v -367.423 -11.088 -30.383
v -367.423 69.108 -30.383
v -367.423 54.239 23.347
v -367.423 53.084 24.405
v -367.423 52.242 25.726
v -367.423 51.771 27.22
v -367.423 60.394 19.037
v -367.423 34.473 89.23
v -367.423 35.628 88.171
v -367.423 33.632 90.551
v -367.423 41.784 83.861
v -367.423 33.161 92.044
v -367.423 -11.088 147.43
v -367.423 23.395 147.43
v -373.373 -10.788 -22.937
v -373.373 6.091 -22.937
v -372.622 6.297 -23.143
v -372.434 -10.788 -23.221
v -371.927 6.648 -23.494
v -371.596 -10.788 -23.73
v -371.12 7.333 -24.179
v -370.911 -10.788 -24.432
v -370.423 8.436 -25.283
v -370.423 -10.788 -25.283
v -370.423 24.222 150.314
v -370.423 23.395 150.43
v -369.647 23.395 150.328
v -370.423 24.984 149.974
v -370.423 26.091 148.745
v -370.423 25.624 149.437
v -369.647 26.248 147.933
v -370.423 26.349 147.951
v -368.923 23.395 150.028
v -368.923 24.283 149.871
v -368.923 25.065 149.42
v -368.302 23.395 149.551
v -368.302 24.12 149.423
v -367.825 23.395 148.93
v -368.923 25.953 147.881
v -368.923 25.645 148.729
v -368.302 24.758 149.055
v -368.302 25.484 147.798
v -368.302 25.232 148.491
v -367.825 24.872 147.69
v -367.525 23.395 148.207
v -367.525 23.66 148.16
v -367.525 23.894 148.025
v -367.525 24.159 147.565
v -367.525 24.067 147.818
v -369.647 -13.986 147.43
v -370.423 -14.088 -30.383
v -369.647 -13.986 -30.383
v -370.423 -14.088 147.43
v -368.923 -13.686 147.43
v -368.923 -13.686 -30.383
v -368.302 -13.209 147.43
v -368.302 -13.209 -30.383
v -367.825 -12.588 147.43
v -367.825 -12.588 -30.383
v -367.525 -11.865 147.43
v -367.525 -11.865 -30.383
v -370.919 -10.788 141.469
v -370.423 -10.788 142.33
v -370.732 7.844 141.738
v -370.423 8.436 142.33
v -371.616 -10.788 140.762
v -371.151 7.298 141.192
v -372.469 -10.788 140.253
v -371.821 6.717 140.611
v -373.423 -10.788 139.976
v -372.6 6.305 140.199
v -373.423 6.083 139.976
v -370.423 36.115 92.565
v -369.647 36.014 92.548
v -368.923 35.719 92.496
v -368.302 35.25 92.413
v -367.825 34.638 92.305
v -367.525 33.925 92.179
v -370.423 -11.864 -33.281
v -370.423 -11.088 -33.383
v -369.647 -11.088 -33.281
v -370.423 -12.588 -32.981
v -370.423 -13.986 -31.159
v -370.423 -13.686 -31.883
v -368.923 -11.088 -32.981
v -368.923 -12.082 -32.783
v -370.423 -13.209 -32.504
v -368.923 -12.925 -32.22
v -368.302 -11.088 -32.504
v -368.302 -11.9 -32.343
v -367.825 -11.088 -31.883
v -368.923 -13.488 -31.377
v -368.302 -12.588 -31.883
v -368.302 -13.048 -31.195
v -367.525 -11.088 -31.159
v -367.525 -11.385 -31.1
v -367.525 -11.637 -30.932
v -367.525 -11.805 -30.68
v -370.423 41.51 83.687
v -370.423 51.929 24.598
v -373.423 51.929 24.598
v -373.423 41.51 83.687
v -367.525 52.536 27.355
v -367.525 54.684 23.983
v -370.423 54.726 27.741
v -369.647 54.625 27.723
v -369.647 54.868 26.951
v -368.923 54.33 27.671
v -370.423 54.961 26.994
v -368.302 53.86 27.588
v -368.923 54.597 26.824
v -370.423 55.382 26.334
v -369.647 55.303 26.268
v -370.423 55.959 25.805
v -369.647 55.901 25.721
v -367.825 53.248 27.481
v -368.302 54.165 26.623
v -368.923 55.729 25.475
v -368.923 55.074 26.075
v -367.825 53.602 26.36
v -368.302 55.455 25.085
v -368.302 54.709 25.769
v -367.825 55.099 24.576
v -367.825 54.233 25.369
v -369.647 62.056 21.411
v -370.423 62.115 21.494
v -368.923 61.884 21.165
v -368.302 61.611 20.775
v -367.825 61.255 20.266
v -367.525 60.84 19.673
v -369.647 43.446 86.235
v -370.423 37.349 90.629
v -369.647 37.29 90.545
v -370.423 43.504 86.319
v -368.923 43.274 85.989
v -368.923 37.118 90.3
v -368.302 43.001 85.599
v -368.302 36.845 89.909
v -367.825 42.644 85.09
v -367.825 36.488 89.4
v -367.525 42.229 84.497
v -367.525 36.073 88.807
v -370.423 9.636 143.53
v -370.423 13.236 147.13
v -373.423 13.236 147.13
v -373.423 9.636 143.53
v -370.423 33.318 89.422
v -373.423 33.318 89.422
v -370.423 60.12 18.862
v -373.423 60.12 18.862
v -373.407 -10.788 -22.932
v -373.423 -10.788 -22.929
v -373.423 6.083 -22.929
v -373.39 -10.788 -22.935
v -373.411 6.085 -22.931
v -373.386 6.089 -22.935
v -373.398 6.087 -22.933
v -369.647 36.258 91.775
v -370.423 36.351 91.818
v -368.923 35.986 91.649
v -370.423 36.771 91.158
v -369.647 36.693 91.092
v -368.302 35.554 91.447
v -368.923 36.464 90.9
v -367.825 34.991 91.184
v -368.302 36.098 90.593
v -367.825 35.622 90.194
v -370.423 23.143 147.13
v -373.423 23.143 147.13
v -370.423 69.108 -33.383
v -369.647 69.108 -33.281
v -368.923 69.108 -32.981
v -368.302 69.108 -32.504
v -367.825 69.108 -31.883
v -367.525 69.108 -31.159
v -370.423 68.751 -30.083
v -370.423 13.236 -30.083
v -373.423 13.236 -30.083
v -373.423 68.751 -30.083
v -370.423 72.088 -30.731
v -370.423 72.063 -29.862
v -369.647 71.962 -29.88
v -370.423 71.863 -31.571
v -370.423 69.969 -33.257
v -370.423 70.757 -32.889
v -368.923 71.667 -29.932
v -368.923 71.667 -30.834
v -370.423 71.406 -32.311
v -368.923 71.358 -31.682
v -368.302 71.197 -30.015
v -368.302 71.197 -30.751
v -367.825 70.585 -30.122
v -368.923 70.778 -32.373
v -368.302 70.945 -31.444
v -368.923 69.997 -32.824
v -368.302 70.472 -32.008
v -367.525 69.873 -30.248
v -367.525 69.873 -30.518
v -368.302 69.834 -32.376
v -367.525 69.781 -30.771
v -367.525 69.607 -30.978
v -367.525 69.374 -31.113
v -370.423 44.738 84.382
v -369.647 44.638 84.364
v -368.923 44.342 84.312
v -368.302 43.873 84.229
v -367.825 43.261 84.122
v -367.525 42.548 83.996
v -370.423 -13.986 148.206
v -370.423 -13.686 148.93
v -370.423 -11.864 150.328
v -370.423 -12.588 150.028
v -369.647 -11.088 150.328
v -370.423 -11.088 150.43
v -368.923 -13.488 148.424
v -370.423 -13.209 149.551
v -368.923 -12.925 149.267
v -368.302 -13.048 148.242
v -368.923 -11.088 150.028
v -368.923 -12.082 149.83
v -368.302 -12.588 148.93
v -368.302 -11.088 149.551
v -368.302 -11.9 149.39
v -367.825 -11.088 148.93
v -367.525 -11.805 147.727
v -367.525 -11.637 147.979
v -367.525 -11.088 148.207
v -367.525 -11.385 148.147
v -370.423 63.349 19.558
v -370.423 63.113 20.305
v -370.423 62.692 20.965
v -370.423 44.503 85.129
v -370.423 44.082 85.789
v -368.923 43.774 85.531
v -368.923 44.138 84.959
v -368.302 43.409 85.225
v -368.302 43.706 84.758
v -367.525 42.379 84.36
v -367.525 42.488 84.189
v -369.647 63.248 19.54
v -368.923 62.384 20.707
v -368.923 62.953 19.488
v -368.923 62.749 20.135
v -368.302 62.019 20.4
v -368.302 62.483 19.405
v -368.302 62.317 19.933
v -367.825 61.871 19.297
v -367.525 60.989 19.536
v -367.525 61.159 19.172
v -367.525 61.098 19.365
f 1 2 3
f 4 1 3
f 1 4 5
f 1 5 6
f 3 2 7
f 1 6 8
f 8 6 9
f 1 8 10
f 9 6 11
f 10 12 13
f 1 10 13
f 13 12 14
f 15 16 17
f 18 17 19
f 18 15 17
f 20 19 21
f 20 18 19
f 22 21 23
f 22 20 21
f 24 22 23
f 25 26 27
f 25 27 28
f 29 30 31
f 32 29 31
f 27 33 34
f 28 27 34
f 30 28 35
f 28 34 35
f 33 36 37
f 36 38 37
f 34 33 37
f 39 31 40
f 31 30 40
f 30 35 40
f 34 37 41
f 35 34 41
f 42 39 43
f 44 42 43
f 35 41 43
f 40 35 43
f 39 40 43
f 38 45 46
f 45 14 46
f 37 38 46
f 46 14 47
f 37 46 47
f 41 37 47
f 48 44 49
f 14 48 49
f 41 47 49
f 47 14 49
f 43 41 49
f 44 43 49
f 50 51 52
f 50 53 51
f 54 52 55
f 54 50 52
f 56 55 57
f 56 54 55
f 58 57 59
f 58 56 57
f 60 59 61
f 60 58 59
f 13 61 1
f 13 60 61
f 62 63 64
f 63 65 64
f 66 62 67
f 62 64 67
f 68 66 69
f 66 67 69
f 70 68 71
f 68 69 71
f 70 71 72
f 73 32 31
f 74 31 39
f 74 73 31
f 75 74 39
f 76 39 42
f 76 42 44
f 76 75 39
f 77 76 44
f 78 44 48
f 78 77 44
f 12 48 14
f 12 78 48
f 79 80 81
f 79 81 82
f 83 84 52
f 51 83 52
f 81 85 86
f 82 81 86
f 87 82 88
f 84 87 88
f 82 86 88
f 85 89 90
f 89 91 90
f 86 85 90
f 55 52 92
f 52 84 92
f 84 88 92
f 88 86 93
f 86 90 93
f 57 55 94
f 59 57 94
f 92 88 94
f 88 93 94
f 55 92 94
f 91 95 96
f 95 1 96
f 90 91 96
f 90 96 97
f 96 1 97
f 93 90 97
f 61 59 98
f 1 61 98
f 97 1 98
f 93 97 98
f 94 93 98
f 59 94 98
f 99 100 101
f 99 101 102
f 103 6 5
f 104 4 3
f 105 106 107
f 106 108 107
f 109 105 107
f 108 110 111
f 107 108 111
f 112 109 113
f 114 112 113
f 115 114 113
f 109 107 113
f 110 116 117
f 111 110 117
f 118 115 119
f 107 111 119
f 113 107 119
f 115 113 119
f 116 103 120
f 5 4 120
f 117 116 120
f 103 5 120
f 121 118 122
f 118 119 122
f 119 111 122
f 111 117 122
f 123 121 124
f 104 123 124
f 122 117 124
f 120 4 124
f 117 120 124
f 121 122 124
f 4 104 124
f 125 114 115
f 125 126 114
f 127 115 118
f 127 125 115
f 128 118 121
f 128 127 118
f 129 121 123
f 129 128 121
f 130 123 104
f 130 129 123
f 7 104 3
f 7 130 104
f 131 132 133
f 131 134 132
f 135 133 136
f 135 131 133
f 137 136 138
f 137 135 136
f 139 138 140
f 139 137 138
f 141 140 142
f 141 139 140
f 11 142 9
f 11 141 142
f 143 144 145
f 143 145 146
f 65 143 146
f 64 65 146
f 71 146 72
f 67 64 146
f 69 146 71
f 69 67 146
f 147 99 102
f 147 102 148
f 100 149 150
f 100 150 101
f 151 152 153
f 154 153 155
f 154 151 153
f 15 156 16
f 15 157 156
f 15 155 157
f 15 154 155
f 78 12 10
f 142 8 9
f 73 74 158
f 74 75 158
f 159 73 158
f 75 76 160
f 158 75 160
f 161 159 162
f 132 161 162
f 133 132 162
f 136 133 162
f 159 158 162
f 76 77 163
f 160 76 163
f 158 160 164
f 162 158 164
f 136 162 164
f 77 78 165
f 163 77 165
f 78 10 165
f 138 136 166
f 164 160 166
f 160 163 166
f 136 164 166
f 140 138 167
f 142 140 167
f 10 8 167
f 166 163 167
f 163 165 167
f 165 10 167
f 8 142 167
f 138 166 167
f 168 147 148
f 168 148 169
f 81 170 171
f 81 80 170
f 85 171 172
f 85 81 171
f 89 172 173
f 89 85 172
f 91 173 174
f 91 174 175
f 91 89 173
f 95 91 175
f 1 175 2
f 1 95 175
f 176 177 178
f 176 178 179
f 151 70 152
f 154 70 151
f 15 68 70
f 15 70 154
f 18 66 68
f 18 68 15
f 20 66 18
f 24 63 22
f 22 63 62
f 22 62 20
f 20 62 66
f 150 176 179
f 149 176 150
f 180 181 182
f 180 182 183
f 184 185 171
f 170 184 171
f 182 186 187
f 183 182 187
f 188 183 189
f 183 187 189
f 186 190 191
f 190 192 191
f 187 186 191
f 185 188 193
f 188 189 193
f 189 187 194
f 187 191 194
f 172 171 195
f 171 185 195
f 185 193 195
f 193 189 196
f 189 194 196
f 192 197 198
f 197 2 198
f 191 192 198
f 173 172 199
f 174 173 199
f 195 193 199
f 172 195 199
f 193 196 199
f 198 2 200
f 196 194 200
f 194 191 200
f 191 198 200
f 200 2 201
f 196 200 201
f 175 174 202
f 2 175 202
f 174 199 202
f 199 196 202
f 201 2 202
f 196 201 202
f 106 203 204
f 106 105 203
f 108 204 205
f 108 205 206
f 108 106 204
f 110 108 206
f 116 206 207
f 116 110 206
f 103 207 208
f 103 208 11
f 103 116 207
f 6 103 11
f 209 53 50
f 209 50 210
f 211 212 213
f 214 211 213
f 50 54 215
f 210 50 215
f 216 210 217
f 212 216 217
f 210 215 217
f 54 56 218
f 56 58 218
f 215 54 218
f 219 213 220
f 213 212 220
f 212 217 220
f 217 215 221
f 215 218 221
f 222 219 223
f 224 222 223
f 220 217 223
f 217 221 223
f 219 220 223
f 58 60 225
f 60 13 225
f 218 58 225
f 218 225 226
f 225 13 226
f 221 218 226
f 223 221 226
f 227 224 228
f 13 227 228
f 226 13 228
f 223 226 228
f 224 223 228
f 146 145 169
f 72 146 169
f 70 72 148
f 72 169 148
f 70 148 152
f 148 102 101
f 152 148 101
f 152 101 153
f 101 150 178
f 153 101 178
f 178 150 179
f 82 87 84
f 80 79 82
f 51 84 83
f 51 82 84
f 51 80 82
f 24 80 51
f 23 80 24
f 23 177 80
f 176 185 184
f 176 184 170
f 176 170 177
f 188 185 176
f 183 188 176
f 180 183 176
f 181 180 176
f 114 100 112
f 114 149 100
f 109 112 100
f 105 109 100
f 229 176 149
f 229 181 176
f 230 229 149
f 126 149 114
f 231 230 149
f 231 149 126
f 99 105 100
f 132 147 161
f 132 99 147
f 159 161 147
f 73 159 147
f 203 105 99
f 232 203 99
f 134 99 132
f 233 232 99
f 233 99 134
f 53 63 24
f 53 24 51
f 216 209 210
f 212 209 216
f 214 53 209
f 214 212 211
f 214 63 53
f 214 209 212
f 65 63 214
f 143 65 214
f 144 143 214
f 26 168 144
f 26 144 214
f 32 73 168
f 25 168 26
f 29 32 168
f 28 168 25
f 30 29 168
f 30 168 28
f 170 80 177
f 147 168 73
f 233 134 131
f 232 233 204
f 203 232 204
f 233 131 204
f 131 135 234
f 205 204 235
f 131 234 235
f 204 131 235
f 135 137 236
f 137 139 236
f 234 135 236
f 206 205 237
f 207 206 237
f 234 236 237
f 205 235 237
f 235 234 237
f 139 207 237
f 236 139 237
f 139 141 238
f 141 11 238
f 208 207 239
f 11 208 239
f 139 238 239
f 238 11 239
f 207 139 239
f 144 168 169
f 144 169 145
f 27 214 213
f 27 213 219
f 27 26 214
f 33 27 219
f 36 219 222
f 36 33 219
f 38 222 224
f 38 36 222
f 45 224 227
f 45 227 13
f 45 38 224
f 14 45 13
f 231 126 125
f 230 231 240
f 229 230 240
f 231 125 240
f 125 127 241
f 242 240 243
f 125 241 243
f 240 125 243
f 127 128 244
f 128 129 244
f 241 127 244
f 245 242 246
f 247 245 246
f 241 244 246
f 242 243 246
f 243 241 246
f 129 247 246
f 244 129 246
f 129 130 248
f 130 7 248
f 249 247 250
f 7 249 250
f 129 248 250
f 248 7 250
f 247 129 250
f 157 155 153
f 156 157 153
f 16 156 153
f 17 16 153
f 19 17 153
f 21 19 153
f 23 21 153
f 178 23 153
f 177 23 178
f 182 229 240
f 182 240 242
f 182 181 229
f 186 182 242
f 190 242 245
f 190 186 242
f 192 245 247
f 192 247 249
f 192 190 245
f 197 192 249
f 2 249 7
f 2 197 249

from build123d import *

# Parameters (mm, degrees)
BOSS_EXTRUDE1_DEPTH  = 3
FILLET1_R            = 3
BOSS_EXTRUDE2_DEPTH  = 3
CUT_EXTRUDE1_START   = -16.870694295
CUT_EXTRUDE1_DEPTH   = 17.870694295
CUT_EXTRUDE1_START_2 = 6.082684495
CUT_EXTRUDE1_2_DEPTH = 3.553569774
CUT_EXTRUDE1_START_3 = -94.677172909
CUT_EXTRUDE1_3_DEPTH = 3.677172909
CUT_EXTRUDE2_REACH   = 418.489


with BuildPart() as part:
    # Sketch1 → Boss-Extrude1 (new body)
    with BuildSketch(Plane.ZY.offset(376.423184311)):
        with BuildLine():
            Line((-33.382889261, -4.0880098), (-33.382889261, -11.0880098))
            ThreePointArc((-33.382889261, -11.0880098), (-32.504209605, -13.209330144), (-30.382889261, -14.0880098))
            Line((-30.382889261, -14.0880098), (147.429996243, -14.0880098))
            ThreePointArc((147.429996243, -14.0880098), (149.551316587, -13.209330144), (150.429996243, -11.0880098))
            Line((150.429996243, -11.0880098), (150.429996243, -4.0880098))
            Line((150.429996243, -4.0880098), (150.429996243, 23.394691306))
            ThreePointArc((150.429996243, 23.394691306), (149.728129572, 25.323054136), (147.950940776, 26.349114566))
            Line((147.950940776, 26.349114566), (92.565293245, 36.115098569))
            ThreePointArc((92.565293245, 36.115098569), (91.474338953, 36.539347491), (90.628781645, 37.348792519))
            Line((90.628781645, 37.348792519), (86.318516116, 43.504489644))
            ThreePointArc((86.318516116, 43.504489644), (85.472958808, 44.313934672), (84.382004516, 44.738183594))
            Line((84.382004516, 44.738183594), (27.741063701, 54.725509672))
            ThreePointArc((27.741063701, 54.725509672), (26.650109409, 55.149758594), (25.804552101, 55.959203622))
            Line((25.804552101, 55.959203622), (21.494286572, 62.114900747))
            ThreePointArc((21.494286572, 62.114900747), (20.648729264, 62.924345775), (19.557774972, 63.348594697))
            Line((19.557774972, 63.348594697), (-29.861944728, 72.062624659))
            ThreePointArc((-29.861944728, 72.062624659), (-32.31125209, 71.406334729), (-33.382889261, 69.1082014))
            Line((-33.382889261, 69.1082014), (-33.382889261, -4.0880098))
        make_face()
    extrude(amount=BOSS_EXTRUDE1_DEPTH)

    # Fillet1
    fillet1_edges = [part.edges().sort_by_distance(p)[0] for p in [
        (-379.423184311, 67.705609678, -5.152084878),
        (-379.423184311, 62.924345775, 20.648729264),
        (-379.423184311, 59.037052184, 23.649419336),
        (-379.423184311, 55.149758594, 26.650109409),
        (-379.423184311, 49.731846633, 56.061534109),
        (-379.423184311, 44.313934672, 85.472958808),
        (-379.423184311, 40.426641081, 88.473648881),
        (-379.423184311, 36.539347491, 91.474338953),
        (-379.423184311, 31.232106567, 120.258117011),
        (-379.423184311, 25.323054136, 149.728129572),
        (-379.423184311, 6.153340753, 150.429996243),
        (-379.423184311, -13.209330144, 149.551316587),
        (-379.423184311, -14.0880098, 58.523553491),
        (-379.423184311, -13.209330144, -32.504209605),
        (-379.423184311, 29.0100958, -33.382889261),
        (-379.423184311, 71.406334729, -32.31125209),
    ]]
    fillet(fillet1_edges, radius=FILLET1_R - 0.0001)  # a hair under: the kernel refuses the full size

    # Sketch2 → Boss-Extrude2 (add)
    with BuildSketch(Plane(origin=(-376.423184311, 0, 0), x_dir=(0, 0, -1), z_dir=(1, 0, 0))):
        Polygon((-147.129996243, 23.142961417), (-147.129996243, 13.236254269), (-143.529996243, 9.636254269), (-143.529996243, -4.0880098), (-143.529996243, -10.7880098), (26.482889261, -10.7880098), (26.482889261, -4.0880098), (26.482889261, 9.636254269), (30.082889261, 13.236254269), (30.082889261, 68.750675322), (-18.862359767, 60.120307341), (-24.598124131, 51.928786898), (-83.686589311, 41.509896238), (-89.422353675, 33.318375795), align=None)
    extrude(amount=BOSS_EXTRUDE2_DEPTH)

    # Cut-Extrude1: read off the stored shape, not the designer's step
    # Cut-Extrude1 outline → Cut-Extrude1 (cut)
    with BuildSketch(Plane.XZ.offset(10.7880098).offset(CUT_EXTRUDE1_START)):
        with BuildLine():
            Line((-376.423184311, 143.529996243), (-376.423184311, 142.329996243))
            ThreePointArc((-376.423184311, 142.329996243), (-375.230428102, 140.761580148), (-373.423184311, 139.97642647))
            Line((-373.423184311, 139.97642647), (-373.423184311, 143.529996243))
            Line((-373.423184311, 143.529996243), (-376.423184311, 143.529996243))
        make_face()
    extrude(amount=CUT_EXTRUDE1_DEPTH, mode=Mode.SUBTRACT)

    # Cut-Extrude1 2 outline → Cut-Extrude1 2 (cut)
    with BuildSketch(Plane(origin=(0, 0, 0), x_dir=(1, 0, 0), z_dir=(0, 1, 0)).offset(CUT_EXTRUDE1_START_2)):
        with BuildLine():
            ThreePointArc((-373.423184311, -139.97642647), (-375.230428102, -140.761580148), (-376.423184311, -142.329996243))
            Line((-376.423184311, -142.329996243), (-376.423184311, -143.529996243))
            Line((-376.423184311, -143.529996243), (-373.423184311, -143.529996243))
            Line((-373.423184311, -143.529996243), (-373.423184311, -139.97642647))
        make_face()
    extrude(amount=CUT_EXTRUDE1_2_DEPTH, mode=Mode.SUBTRACT)

    # Cut-Extrude1 3 outline → Cut-Extrude1 3 (add)
    with BuildSketch(Plane(origin=(0, 0, 0), x_dir=(1, 0, 0), z_dir=(0, 0.707106781186553, -0.707106781186542)).offset(CUT_EXTRUDE1_START_3)):
        with BuildLine():
            Line((-376.423184311, -106.607838111), (-376.423184311, -113.39606321))
            Line((-376.423184311, -113.39606321), (-373.423184311, -113.39606321))
            Line((-373.423184311, -113.39606321), (-373.423184311, -103.279387817))
            add(Edge.make_bspline(
                [(-373.423184311, -103.279387817), (-375.582623677, -103.754880716), (-376.423184311, -106.607838111)],
                knots=[0.154459598, 0.154459598, 0.154459598, 1.176005207, 1.176005207, 1.176005207], degree=2, weights=[1, 0.872366982, 1]))
        make_face()
    extrude(amount=CUT_EXTRUDE1_3_DEPTH)

    # Cut-Extrude2: up to this plane
    cut_extrude2_end = Plane(origin=(-373.423184311, -8.423317496, -8.423317496), z_dir=(0, 0.7071067811865445, 0.7071067811865507))
    # Sketch3<3> → Cut-Extrude2 (cut, up to the surface)
    with BuildSketch(Plane.XZ.offset(10.7880098), mode=Mode.PRIVATE) as cut_extrude2_sk1:
        with BuildLine():
            Line((-373.423184311, -26.482889261), (-373.423184311, -23.233241391))
            ThreePointArc((-373.423184311, -23.233241391), (-375.473428882, -24.346456682), (-376.410662534, -26.482889261))
            Line((-376.410662534, -26.482889261), (-373.423184311, -26.482889261))
        make_face()
    cut_extrude2_tool1 = split(extrude(cut_extrude2_sk1.sketch, amount=-CUT_EXTRUDE2_REACH, mode=Mode.PRIVATE), bisect_by=cut_extrude2_end, keep=Keep.BOTH, mode=Mode.PRIVATE)
    add(cut_extrude2_tool1.solids().sort_by_distance((-374.649681, -10.78801, -25.160842))[0], mode=Mode.SUBTRACT)
    # Sketch3<3> → Cut-Extrude2 (cut, up to the surface)
    with BuildSketch(Plane.XZ.offset(10.7880098), mode=Mode.PRIVATE) as cut_extrude2_sk2:
        with BuildLine():
            ThreePointArc((-373.473184311, -22.937437402), (-375.250304231, -23.730170981), (-376.423184311, -25.282889261))
            Line((-376.423184311, -25.282889261), (-376.423184311, -26.482889261))
            Line((-376.423184311, -26.482889261), (-376.410662534, -26.482889261))
            ThreePointArc((-376.410662534, -26.482889261), (-375.473428882, -24.346456682), (-373.423184311, -23.233241391))
            Line((-373.423184311, -23.233241391), (-373.423184311, -22.929319487))
            ThreePointArc((-373.423184311, -22.929319487), (-373.448197491, -22.933297266), (-373.473184311, -22.937437402))
        make_face()
    cut_extrude2_tool2 = split(extrude(cut_extrude2_sk2.sketch, amount=-CUT_EXTRUDE2_REACH, mode=Mode.PRIVATE), bisect_by=cut_extrude2_end, keep=Keep.BOTH, mode=Mode.PRIVATE)
    add(cut_extrude2_tool2.solids().sort_by_distance((-373.46969, -10.78801, -23.08128))[0], mode=Mode.SUBTRACT)


with BuildPart() as body_2:
    # Mirror1: mirrored copy
    add(part.part.mirror(Plane(origin=(-373.423184311, 0, 0), x_dir=(0, 0, 1), z_dir=(1, 0, 0))))


solid = body_2.part
